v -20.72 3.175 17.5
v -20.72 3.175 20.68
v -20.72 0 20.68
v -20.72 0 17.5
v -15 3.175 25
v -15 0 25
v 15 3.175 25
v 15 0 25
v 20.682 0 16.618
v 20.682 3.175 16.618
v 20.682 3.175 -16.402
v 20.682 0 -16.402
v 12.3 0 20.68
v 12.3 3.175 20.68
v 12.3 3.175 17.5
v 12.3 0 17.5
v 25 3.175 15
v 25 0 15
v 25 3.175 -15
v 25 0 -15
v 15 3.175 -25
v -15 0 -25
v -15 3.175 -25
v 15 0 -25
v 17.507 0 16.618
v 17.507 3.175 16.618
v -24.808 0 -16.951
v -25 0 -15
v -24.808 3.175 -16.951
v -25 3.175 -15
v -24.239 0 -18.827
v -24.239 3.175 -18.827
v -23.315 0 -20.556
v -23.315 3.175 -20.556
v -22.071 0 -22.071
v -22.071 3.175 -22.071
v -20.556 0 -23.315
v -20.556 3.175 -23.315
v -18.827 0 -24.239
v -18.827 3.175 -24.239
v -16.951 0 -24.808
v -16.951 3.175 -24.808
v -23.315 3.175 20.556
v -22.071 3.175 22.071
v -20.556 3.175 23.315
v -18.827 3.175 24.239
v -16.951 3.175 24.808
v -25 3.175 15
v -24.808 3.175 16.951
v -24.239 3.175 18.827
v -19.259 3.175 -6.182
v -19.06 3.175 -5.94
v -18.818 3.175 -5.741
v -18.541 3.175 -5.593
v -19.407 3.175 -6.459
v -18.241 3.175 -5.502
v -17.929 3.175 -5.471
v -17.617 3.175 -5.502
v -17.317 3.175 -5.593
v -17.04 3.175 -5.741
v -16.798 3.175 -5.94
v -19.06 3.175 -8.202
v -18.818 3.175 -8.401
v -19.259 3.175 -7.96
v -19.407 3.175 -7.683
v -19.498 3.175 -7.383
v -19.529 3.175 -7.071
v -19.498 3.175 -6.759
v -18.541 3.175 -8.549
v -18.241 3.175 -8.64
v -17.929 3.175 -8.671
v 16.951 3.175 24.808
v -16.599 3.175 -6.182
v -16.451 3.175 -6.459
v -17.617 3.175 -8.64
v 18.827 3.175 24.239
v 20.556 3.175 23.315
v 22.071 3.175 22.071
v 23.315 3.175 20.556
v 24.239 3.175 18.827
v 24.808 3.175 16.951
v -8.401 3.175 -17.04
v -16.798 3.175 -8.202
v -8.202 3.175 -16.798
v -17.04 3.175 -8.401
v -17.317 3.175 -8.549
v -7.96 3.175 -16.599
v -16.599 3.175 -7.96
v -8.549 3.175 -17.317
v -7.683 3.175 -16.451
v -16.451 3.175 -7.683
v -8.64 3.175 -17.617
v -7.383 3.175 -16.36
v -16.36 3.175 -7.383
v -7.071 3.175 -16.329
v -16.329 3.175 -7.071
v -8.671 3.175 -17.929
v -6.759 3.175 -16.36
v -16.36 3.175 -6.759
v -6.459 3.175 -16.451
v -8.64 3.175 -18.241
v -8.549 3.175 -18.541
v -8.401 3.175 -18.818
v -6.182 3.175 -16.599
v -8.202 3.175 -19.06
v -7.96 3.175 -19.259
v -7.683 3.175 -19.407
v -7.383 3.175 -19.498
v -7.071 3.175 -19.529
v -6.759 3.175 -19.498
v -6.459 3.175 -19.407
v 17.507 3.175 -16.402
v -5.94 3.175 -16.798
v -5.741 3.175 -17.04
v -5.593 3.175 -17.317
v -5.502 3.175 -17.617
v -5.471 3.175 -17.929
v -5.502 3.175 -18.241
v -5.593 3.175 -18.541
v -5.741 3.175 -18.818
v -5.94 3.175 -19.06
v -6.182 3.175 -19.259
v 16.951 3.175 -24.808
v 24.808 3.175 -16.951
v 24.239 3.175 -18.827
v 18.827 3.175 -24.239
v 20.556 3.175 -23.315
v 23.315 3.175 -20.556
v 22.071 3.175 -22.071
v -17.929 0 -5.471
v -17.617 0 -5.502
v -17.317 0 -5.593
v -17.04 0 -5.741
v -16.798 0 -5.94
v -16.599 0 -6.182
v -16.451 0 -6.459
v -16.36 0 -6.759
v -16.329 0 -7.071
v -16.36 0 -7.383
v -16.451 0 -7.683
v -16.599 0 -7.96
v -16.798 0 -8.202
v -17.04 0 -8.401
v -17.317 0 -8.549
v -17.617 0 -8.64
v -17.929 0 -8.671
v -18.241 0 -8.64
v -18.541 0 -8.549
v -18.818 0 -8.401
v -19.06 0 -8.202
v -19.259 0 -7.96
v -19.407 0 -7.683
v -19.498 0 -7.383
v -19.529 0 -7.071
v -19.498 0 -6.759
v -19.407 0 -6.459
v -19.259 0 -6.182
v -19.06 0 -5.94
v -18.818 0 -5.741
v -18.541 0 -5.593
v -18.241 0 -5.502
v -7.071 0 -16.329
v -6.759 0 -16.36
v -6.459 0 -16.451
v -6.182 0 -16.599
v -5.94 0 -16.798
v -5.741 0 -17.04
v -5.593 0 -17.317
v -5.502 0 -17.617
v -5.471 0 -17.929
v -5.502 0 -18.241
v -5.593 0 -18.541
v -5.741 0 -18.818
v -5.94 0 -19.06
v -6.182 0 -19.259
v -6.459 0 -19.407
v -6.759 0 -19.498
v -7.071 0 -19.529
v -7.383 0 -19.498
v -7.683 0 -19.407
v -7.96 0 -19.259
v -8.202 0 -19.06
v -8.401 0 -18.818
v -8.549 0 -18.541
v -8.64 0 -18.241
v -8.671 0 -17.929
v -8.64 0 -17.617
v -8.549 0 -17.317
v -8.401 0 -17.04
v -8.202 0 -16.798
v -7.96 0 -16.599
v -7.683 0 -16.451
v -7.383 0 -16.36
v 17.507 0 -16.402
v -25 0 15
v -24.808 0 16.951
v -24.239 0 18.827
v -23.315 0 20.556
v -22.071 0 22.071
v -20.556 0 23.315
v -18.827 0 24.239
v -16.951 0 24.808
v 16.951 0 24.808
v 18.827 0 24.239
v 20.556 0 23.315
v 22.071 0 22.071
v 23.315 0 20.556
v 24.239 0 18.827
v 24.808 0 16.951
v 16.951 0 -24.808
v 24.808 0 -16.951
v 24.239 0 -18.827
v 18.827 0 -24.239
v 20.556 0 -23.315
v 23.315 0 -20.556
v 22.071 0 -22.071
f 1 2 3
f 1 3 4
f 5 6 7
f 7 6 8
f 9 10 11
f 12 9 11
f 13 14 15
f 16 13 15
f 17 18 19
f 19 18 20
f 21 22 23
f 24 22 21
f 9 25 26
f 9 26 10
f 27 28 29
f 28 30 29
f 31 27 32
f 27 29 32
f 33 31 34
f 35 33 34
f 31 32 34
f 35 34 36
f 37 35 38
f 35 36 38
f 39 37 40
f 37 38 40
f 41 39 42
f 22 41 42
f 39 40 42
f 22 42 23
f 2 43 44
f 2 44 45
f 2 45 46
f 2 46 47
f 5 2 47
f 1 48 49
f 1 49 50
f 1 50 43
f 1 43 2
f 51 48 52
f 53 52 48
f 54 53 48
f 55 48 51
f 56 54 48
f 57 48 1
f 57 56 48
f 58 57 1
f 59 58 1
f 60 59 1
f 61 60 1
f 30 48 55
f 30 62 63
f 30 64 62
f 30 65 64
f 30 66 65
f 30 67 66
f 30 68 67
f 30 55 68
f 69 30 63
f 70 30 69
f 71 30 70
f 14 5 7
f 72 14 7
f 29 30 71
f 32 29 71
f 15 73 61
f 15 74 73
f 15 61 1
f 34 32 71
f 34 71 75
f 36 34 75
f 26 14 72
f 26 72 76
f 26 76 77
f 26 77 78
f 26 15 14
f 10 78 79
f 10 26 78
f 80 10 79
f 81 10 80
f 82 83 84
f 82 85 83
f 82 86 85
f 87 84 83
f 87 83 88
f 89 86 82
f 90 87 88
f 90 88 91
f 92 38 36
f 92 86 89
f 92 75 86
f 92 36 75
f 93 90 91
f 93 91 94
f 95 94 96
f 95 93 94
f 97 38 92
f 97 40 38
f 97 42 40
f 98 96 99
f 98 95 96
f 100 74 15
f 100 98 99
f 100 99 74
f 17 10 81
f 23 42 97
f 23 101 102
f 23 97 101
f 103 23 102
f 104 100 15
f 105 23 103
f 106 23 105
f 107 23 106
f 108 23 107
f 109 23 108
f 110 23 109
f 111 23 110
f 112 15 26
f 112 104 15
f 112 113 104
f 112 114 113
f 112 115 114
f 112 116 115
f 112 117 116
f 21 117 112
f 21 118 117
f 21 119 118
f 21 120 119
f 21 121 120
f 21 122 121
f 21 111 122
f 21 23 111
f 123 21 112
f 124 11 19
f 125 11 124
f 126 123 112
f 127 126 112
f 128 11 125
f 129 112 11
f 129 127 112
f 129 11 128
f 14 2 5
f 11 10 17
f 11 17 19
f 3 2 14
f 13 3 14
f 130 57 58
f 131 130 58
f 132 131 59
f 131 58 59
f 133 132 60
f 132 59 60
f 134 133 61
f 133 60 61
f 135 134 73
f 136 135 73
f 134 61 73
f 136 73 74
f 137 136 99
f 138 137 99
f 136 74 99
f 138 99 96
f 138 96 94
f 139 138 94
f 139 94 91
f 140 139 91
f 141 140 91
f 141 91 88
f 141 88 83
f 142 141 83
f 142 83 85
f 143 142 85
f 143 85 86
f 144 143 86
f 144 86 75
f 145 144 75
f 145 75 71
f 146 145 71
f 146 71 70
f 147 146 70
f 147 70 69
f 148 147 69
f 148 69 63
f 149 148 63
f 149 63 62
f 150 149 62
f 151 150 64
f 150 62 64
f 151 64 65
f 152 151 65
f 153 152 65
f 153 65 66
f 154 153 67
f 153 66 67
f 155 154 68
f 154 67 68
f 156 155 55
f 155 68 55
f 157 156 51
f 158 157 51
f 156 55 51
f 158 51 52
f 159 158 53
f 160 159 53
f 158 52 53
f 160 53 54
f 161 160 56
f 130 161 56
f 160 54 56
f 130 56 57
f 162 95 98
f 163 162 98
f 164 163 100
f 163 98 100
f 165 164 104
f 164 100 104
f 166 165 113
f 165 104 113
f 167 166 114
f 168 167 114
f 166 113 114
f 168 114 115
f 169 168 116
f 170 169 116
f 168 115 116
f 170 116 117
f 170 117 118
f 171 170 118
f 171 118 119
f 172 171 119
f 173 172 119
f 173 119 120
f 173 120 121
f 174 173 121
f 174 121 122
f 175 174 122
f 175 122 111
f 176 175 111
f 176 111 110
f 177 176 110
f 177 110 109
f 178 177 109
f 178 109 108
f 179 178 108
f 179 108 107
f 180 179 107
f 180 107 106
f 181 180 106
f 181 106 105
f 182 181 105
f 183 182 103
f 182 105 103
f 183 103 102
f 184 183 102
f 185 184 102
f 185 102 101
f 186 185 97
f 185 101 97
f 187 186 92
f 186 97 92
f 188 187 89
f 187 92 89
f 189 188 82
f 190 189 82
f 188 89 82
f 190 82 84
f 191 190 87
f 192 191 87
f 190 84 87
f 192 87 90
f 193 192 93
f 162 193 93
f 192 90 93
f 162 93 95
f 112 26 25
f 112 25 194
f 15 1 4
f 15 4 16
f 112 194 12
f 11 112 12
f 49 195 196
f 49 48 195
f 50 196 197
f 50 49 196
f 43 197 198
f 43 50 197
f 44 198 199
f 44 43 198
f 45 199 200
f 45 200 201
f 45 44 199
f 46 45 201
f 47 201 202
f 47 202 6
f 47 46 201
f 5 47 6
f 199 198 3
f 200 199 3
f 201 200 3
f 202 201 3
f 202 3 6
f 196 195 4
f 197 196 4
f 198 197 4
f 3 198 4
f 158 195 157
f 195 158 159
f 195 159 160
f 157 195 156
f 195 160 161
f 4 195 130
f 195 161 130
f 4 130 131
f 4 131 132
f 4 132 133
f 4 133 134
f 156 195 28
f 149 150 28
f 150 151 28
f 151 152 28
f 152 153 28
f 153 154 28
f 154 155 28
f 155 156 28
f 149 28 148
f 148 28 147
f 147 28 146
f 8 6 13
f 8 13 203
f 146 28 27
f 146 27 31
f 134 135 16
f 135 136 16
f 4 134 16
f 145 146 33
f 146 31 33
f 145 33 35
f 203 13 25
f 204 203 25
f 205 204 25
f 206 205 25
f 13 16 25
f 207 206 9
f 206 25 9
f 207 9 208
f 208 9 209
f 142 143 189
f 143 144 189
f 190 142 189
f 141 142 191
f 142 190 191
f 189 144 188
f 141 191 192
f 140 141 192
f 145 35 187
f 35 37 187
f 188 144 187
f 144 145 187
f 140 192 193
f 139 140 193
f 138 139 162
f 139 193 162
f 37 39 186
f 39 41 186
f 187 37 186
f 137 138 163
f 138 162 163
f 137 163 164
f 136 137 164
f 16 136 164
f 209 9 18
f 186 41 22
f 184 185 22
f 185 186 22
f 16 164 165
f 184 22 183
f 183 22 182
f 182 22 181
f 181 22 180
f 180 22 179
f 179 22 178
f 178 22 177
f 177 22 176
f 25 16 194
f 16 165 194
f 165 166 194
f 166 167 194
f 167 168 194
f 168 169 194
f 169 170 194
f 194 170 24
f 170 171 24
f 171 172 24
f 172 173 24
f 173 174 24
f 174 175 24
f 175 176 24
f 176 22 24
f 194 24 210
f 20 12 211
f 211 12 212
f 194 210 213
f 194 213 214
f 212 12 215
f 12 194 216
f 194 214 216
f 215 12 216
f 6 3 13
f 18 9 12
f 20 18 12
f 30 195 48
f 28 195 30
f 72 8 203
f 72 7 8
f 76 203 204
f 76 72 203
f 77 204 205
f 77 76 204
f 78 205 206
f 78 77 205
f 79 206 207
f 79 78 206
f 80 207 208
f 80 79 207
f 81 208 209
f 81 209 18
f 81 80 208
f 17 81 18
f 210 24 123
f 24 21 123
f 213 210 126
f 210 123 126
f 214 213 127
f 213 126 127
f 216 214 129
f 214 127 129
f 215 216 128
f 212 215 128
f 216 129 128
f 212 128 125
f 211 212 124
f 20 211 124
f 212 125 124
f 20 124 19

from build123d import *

# Parameters (mm, degrees)
SKETCH1_W           = 50
SKETCH1_H           = 50
BOSS_EXTRUDE1_DEPTH = 3.175
SKETCH2_W           = 3.175
SKETCH2_H           = 33.02
SKETCH2_W_2         = 33.02
SKETCH2_H_2         = 3.18
CUT_EXTRUDE1_DEPTH  = 36.497614356
SKETCH3_R           = 1.6
CUT_EXTRUDE2_DEPTH  = 36.497614356
FILLET1_R           = 10


with BuildPart() as part:
    # Sketch1 → Boss-Extrude1 (new body)
    with BuildSketch(Plane(origin=(0, 0, 0), x_dir=(1, 0, 0), z_dir=(0, 1, 0))):
        Rectangle(SKETCH1_W, SKETCH1_H)
    extrude(amount=BOSS_EXTRUDE1_DEPTH)

    # Sketch2 → Cut-Extrude1 (cut, through all)
    with BuildSketch(Plane(origin=(0, 3.175, 0), x_dir=(1, 0, 0), z_dir=(0, 1, 0))):
        with Locations((19.0945, -0.108)):
            Rectangle(SKETCH2_W, SKETCH2_H)
        with Locations((-4.21, -19.09)):
            Rectangle(SKETCH2_W_2, SKETCH2_H_2)
    extrude(amount=-CUT_EXTRUDE1_DEPTH, mode=Mode.SUBTRACT)

    # Sketch3 → Cut-Extrude2 (cut, through all)
    with BuildSketch(Plane(origin=(0, 3.175, 0), x_dir=(1, 0, 0), z_dir=(0, 1, 0))):
        with Locations(Location((-7.071067812, 17.928932188, 0), (0, 0, 270))):
            Circle(SKETCH3_R)
        with Locations(Location((-17.928932188, 7.071067812, 0), (0, 0, 270))):
            Circle(SKETCH3_R)
    extrude(amount=-CUT_EXTRUDE2_DEPTH, mode=Mode.SUBTRACT)

    # Fillet1
    fillet1_edges = [part.edges().sort_by_distance(p)[0] for p in [
        (25, 1.5875, 25),
        (-25, 1.5875, 25),
        (-25, 1.5875, -25),
        (25, 1.5875, -25),
    ]]
    fillet(fillet1_edges, radius=FILLET1_R)


solid = part.part
